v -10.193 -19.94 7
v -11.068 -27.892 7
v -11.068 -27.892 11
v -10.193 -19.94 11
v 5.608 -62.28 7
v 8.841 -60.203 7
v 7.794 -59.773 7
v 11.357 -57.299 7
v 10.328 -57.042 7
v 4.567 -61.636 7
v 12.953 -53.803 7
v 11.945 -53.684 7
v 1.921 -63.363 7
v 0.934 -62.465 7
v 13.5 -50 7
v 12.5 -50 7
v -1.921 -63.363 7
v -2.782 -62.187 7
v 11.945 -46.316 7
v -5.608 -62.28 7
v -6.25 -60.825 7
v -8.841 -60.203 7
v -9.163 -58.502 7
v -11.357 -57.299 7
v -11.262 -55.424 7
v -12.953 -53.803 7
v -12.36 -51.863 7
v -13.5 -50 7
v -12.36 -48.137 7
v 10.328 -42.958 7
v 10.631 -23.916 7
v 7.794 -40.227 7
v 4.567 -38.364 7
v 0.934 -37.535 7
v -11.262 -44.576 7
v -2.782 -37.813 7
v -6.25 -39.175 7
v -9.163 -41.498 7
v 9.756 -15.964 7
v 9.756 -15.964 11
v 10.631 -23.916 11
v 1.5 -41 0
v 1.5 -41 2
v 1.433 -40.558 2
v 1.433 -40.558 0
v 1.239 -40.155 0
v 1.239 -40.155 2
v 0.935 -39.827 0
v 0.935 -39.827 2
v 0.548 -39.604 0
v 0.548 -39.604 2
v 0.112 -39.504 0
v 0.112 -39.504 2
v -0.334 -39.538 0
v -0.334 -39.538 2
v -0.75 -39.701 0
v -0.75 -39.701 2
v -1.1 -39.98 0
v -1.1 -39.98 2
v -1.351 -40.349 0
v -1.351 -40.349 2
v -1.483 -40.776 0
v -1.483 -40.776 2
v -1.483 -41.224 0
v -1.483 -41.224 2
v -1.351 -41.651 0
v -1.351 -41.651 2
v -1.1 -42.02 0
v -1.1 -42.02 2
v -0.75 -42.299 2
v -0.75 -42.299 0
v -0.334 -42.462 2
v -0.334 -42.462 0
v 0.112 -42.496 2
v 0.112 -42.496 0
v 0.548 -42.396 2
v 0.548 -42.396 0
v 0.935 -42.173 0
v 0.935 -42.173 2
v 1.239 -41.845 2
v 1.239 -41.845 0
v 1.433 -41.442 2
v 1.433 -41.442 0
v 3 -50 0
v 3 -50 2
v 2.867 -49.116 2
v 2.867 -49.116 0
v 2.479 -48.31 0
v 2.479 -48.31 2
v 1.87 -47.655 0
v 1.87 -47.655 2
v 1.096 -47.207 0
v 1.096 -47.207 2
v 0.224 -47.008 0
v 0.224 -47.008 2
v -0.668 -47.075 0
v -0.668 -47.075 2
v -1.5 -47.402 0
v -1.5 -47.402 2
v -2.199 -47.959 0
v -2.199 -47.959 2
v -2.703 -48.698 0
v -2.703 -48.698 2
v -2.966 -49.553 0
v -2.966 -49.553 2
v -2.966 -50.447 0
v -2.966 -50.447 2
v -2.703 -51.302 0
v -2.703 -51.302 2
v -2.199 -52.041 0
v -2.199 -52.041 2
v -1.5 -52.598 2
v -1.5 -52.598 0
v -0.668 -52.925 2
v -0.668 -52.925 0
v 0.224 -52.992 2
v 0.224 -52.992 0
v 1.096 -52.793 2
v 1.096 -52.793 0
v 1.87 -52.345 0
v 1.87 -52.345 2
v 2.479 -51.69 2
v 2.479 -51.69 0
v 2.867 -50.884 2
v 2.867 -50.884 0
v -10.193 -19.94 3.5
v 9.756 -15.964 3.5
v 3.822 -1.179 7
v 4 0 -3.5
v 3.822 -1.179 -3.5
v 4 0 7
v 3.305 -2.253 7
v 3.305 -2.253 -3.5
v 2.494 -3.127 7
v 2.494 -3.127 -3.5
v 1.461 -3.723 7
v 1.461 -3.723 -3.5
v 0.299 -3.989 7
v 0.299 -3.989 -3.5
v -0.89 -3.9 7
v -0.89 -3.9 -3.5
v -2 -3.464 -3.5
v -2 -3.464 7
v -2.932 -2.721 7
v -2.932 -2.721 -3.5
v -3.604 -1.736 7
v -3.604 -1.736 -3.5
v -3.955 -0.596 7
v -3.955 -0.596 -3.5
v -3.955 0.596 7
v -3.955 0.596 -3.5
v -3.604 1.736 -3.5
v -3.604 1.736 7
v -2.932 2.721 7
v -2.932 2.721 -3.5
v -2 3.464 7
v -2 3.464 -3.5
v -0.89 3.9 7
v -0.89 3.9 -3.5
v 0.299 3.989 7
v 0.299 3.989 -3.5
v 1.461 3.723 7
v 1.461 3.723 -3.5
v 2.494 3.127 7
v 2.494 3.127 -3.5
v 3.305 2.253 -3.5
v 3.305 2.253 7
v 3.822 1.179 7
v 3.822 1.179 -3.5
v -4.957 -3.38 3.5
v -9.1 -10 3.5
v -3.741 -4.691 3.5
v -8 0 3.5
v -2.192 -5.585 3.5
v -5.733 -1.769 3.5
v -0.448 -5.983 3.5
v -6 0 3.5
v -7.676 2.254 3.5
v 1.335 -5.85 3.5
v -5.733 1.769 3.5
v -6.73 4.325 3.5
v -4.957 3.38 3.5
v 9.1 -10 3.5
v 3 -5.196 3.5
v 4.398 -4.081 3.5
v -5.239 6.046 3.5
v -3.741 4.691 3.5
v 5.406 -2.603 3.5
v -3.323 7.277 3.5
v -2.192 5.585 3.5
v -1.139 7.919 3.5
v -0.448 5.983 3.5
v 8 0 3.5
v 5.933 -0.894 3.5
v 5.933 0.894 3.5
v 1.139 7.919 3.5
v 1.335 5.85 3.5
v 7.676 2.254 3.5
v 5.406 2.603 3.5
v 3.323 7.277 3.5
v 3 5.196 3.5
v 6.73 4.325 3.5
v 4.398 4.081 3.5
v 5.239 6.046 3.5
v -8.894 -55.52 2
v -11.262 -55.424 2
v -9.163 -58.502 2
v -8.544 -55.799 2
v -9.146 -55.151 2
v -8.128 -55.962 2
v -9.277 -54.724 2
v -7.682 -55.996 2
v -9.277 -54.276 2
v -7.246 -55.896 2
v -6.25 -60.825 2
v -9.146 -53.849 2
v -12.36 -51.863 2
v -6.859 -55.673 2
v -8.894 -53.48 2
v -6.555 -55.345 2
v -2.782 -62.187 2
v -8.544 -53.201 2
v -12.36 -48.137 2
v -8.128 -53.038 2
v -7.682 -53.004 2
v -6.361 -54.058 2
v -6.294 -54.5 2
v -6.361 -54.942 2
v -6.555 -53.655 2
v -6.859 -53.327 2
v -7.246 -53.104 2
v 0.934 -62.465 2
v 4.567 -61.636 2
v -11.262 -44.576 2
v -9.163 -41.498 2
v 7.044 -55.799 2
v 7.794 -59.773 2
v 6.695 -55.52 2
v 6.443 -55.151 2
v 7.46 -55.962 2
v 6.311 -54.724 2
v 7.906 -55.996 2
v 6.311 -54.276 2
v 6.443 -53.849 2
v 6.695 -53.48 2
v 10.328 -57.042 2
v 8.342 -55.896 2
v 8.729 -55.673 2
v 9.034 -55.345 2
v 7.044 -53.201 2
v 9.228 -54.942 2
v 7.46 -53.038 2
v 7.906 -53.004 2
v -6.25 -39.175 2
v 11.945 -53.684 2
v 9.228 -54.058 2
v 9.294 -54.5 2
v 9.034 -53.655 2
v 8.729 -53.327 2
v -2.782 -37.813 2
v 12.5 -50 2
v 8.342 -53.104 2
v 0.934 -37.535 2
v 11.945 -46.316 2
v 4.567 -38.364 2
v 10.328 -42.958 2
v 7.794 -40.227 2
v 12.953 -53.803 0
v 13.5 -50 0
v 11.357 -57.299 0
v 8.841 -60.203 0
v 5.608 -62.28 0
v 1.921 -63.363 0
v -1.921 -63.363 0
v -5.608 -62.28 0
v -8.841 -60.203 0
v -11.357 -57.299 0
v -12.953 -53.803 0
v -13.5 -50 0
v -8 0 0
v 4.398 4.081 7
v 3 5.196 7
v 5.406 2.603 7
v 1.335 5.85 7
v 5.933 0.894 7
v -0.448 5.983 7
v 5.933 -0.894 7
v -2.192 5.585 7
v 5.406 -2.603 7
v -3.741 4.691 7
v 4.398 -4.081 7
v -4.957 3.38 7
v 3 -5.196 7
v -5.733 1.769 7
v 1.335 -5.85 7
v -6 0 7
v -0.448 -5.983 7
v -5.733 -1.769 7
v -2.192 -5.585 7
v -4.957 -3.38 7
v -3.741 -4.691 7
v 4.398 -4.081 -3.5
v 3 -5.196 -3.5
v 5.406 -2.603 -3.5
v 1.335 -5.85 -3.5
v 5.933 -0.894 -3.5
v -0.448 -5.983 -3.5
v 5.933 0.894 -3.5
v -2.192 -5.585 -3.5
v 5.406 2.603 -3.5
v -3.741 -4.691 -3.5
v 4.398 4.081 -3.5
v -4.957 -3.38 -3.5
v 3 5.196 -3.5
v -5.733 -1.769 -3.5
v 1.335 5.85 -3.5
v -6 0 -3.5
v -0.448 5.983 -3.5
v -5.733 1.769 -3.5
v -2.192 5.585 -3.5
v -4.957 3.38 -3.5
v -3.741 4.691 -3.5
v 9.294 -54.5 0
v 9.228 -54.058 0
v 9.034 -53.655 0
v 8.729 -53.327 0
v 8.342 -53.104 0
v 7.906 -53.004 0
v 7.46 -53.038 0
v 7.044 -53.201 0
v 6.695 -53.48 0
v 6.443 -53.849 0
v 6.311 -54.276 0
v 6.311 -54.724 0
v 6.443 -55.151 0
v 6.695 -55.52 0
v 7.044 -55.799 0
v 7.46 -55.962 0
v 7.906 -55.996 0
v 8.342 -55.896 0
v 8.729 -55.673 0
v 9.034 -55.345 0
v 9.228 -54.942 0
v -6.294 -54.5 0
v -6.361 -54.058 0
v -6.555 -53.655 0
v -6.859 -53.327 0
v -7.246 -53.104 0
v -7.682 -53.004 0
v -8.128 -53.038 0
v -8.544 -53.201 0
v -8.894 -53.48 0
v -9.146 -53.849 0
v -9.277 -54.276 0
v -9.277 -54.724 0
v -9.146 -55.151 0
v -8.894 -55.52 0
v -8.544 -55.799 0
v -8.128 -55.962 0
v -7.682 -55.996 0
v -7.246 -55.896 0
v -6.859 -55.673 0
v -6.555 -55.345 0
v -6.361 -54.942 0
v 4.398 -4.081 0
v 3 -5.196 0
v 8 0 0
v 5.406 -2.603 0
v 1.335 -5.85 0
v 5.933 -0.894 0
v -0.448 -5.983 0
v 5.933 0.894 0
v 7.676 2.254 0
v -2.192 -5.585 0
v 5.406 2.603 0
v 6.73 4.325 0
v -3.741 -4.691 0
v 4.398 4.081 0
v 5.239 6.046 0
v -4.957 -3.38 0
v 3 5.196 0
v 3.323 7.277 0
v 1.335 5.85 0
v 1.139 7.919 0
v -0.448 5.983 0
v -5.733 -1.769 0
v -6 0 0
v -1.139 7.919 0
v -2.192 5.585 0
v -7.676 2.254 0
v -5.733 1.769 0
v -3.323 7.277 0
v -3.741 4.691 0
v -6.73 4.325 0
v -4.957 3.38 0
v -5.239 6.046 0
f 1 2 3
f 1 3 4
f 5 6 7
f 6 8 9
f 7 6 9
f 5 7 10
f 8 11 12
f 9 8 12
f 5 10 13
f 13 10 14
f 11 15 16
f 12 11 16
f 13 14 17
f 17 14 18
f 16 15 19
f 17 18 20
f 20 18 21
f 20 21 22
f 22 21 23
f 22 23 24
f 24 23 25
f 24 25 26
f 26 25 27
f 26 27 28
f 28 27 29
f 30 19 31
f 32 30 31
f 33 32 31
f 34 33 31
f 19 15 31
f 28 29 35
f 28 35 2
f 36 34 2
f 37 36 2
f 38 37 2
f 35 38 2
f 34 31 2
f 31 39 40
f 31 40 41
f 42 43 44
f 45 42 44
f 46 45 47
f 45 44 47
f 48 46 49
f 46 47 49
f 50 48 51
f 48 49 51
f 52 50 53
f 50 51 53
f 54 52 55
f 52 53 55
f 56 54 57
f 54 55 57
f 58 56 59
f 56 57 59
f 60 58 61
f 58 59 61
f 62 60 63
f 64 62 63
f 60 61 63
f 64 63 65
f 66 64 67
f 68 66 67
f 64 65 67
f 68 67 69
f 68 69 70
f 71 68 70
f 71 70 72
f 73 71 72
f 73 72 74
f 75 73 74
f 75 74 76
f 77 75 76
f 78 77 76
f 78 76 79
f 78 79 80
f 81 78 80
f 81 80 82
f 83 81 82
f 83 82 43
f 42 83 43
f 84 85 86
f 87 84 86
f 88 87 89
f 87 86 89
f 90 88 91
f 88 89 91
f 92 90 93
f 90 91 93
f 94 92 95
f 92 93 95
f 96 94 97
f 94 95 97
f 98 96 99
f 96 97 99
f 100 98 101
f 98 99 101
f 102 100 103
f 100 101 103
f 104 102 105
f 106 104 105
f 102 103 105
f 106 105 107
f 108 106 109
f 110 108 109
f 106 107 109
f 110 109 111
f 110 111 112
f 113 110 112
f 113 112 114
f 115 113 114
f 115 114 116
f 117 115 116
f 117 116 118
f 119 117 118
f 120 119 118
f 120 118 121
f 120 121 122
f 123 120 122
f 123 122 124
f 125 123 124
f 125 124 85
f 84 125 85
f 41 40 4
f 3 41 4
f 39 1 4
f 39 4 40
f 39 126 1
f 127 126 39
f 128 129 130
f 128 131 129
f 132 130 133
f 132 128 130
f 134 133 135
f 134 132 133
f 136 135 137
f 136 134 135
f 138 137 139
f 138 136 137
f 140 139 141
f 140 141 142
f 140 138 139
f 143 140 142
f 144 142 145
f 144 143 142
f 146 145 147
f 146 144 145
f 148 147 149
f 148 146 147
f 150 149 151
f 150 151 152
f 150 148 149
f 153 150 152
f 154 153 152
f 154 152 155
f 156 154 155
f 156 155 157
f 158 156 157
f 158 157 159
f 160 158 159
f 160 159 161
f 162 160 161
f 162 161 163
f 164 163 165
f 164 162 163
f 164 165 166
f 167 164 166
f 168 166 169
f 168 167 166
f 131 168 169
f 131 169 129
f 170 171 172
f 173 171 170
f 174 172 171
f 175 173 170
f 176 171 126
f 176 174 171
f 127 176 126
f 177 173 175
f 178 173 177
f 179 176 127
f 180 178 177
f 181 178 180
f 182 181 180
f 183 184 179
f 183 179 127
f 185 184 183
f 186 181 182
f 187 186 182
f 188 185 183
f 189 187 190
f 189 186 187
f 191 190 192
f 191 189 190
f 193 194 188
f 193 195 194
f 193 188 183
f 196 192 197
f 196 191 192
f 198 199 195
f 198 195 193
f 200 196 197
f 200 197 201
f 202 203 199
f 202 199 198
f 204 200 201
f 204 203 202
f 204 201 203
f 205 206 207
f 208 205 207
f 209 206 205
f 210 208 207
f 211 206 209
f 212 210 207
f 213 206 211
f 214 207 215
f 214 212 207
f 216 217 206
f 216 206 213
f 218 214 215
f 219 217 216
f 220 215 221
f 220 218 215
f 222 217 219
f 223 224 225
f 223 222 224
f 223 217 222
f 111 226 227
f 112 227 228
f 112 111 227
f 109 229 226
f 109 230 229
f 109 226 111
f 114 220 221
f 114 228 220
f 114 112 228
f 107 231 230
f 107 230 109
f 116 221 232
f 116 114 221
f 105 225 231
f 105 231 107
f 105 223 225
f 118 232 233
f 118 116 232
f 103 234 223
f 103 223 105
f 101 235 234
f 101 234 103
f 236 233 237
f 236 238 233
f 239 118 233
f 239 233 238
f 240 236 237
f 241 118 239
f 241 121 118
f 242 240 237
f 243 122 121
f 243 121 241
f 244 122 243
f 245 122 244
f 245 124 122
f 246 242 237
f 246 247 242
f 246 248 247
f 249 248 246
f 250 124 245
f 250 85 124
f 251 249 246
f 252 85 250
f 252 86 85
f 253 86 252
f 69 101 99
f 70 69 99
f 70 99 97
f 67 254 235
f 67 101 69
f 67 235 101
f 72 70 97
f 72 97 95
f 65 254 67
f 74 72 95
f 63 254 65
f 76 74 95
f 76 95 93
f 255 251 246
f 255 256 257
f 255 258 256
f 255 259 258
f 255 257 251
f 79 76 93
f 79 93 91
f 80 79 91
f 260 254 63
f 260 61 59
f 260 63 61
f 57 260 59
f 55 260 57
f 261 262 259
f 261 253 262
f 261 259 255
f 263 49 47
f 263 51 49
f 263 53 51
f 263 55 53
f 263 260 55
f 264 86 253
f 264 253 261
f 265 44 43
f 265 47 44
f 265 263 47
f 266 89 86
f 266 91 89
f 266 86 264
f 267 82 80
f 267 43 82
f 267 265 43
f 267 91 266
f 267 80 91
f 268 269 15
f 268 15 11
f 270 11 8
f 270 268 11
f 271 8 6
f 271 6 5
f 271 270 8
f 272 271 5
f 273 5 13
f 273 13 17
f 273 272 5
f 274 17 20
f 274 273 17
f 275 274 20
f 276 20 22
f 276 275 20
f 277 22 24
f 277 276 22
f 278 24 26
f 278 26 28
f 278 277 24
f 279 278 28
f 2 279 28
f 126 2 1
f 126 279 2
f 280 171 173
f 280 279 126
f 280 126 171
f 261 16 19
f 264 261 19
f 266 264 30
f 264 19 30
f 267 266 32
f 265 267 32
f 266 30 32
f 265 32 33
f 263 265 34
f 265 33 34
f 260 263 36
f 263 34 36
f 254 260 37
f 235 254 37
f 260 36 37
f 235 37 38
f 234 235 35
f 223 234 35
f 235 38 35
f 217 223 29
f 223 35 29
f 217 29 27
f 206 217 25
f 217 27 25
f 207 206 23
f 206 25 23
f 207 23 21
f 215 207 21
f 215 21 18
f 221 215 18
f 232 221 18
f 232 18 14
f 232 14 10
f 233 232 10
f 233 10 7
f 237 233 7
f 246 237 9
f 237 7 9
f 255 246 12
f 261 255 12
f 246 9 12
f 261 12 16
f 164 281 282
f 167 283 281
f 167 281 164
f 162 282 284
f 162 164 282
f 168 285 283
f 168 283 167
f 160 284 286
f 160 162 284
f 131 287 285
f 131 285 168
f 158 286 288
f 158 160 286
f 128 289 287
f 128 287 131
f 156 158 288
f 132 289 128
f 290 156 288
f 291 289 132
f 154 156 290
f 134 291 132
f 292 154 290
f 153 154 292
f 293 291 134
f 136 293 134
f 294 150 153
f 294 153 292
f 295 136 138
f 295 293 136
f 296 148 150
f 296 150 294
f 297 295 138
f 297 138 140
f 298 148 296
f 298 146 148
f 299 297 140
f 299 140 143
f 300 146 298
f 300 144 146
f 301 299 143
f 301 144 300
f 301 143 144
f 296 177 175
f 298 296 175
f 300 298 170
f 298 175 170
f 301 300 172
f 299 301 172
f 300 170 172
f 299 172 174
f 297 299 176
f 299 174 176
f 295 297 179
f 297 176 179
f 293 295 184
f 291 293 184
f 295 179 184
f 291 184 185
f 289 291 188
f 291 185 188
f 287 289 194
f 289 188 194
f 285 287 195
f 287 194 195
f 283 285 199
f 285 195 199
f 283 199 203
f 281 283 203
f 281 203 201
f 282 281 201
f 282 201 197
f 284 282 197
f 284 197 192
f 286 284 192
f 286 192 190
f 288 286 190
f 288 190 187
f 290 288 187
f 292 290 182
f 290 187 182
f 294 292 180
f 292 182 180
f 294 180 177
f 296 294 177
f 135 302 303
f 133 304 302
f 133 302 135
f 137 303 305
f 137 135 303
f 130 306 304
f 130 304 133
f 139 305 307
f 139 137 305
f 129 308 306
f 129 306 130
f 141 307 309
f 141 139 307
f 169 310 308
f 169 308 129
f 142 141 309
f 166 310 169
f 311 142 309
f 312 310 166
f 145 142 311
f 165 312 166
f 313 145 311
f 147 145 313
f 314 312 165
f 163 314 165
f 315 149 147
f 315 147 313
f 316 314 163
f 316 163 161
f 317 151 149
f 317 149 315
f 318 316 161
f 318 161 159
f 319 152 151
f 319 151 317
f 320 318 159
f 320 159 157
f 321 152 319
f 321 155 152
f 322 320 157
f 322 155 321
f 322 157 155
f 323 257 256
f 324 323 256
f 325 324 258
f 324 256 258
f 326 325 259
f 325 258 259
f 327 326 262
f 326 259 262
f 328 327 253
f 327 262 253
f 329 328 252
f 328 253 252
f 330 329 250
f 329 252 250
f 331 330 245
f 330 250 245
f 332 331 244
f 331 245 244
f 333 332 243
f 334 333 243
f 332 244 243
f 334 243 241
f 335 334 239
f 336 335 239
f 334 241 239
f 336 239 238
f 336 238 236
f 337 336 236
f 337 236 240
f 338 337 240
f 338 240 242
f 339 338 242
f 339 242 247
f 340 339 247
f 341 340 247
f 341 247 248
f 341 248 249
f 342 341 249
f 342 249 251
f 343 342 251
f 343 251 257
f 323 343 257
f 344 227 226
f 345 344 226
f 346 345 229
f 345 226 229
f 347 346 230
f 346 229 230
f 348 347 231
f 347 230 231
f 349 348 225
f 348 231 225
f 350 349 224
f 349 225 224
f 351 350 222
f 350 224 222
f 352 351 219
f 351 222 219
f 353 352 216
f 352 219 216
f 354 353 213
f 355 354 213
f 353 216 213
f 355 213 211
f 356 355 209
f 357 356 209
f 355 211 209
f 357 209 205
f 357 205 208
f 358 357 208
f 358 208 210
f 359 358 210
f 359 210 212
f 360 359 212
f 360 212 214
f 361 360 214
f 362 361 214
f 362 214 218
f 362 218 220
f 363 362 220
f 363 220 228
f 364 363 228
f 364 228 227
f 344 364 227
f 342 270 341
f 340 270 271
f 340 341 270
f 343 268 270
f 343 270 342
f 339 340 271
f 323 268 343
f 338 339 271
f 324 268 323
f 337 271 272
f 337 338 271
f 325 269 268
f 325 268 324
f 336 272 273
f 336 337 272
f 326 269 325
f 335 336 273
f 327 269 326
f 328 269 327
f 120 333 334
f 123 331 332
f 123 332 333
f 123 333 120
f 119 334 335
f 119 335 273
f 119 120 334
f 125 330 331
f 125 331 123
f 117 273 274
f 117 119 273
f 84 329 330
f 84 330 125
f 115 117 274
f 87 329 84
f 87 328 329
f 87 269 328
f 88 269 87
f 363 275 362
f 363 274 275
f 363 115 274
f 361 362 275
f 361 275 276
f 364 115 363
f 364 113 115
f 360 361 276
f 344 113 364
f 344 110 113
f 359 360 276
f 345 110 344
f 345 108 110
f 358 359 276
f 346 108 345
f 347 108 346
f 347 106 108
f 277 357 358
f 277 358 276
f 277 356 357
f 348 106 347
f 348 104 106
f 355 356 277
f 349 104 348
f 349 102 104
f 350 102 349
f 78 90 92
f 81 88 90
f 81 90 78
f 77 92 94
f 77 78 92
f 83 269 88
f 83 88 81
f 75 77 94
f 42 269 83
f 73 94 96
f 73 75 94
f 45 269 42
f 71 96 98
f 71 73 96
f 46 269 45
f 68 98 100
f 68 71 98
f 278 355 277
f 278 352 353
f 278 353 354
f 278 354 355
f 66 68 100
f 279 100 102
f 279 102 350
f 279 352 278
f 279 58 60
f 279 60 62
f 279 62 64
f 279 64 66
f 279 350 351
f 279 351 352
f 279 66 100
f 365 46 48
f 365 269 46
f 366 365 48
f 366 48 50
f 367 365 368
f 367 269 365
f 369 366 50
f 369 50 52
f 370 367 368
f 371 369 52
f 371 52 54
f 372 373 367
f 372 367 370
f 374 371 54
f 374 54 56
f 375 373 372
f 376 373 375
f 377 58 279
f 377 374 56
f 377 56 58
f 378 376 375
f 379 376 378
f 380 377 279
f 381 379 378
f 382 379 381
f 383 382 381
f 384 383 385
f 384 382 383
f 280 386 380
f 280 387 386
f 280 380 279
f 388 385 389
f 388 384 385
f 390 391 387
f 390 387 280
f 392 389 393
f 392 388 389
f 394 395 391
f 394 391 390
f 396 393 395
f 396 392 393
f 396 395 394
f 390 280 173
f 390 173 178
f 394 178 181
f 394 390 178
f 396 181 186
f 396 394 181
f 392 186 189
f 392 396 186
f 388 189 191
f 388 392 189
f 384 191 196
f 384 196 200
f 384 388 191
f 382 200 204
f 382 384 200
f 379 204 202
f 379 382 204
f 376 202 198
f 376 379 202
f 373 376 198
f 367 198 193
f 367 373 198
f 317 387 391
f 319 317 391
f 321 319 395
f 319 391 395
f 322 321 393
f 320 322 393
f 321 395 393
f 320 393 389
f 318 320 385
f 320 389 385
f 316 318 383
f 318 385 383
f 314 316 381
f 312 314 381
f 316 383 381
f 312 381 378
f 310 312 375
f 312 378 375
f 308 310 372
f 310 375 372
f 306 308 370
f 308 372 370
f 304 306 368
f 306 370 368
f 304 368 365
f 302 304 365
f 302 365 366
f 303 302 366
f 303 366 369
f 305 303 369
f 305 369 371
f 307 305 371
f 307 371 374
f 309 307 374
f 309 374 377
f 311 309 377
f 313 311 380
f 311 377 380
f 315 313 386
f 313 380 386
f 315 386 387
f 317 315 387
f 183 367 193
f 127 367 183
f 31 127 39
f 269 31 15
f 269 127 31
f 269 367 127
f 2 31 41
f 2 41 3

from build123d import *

# Parameters (mm, degrees)
BOSS_EXTRU_1_DEPTH      = 7
ESQUISSE2_R             = 3
ENL_V_MAT_EXTRU_1_DEPTH = 7
ESQUISSE3_R             = 1.5
ENL_V_MAT_EXTRU_2_DEPTH = 7
ESQUISSE5_R             = 12.5
ENL_V_MAT_EXTRU_5_DEPTH = 5
ESQUISSE10_W            = 27
ESQUISSE10_H            = 3.5
ENL_V_MAT_EXTRU_6_DEPTH = 20
ESQUISSE12_R            = 6
BOSS_EXTRU_3_DEPTH      = 3.5
ESQUISSE13_R            = 4
ENL_V_MAT_EXTRU_7_DEPTH = 66.295482233
ENL_V_MAT_EXTRU_8_DEPTH = 3.5
BOSS_EXTRU_4_DEPTH      = 4
ESQUISSE16_R            = 6
ESQUISSE16_R_2          = 4
BOSS_EXTRU_5_DEPTH      = 3.5


with BuildPart() as part:
    # Esquisse1 → Boss.-Extru.1 (new body)
    with BuildSketch(Plane.XY):
        with BuildLine():
            Line((8, 0), (13.5, -50))
            ThreePointArc((13.5, -50), (0, -63.5), (-13.5, -50))
            Line((-13.5, -50), (-8, 0))
            ThreePointArc((-8, 0), (0, 8), (8, 0))
        make_face()
    extrude(amount=BOSS_EXTRU_1_DEPTH)

    # Esquisse2 → Enlèv. mat.-Extru.1 (cut)
    with BuildSketch(Plane.XY.offset(7)):
        with Locations((0, -50)):
            Circle(ESQUISSE2_R)
    extrude(amount=-ENL_V_MAT_EXTRU_1_DEPTH, mode=Mode.SUBTRACT)

    # Esquisse3 → Enlèv. mat.-Extru.2 (cut)
    with BuildSketch(Plane.XY.offset(7)):
        with Locations((0, -41)):
            Circle(ESQUISSE3_R)
        with Locations((-7.794228634, -54.5)):
            Circle(ESQUISSE3_R)
        with Locations((7.794228634, -54.5)):
            Circle(ESQUISSE3_R)
    extrude(amount=-ENL_V_MAT_EXTRU_2_DEPTH, mode=Mode.SUBTRACT)

    # Esquisse5 → Enlèv. mat.-Extru.5 (cut)
    with BuildSketch(Plane.XY.offset(7)):
        with Locations((0, -50)):
            Circle(ESQUISSE5_R)
    extrude(amount=-ENL_V_MAT_EXTRU_5_DEPTH, mode=Mode.SUBTRACT)

    # Esquisse10 → Enlèv. mat.-Extru.6 (cut)
    with BuildSketch(Plane(origin=(0, 10, 0), x_dir=(1, 0, 0), z_dir=(0, 1, 0))):
        with Locations((0, -5.25)):
            Rectangle(ESQUISSE10_W, ESQUISSE10_H)
    extrude(amount=-ENL_V_MAT_EXTRU_6_DEPTH, mode=Mode.SUBTRACT)

    # Esquisse12 → Boss.-Extru.3 (add)
    with BuildSketch(Plane.XY.offset(3.5)):
        with Locations(Location((0, 0, 0), (0, 0, 180))):
            Circle(ESQUISSE12_R)
    extrude(amount=BOSS_EXTRU_3_DEPTH)

    # Esquisse13 → Enlèv. mat.-Extru.7 (cut, through all)
    with BuildSketch(Plane.XY.offset(7)):
        Circle(ESQUISSE13_R)
    extrude(amount=-ENL_V_MAT_EXTRU_7_DEPTH, mode=Mode.SUBTRACT)

    # Esquisse14 → Enlèv. mat.-Extru.8 (cut)
    with BuildSketch(Plane.XY.offset(7)):
        Polygon((-9.1, -10), (-10.193404792, -19.940043559), (9.756042875, -15.964026136), (9.1, -10), align=None)
    extrude(amount=-ENL_V_MAT_EXTRU_8_DEPTH, mode=Mode.SUBTRACT)

    # Esquisse15 → Boss.-Extru.4 (add)
    with BuildSketch(Plane.XY.offset(7)):
        Polygon((-10.193404792, -19.940043559), (9.756042875, -15.964026136), (10.630766708, -23.916060983), (-11.068128625, -27.892078407), align=None)
    extrude(amount=BOSS_EXTRU_4_DEPTH)

    # Esquisse16 → Boss.-Extru.5 (add)
    with BuildSketch(Plane(origin=(0, 0, 0), x_dir=(-1, 0, 0), z_dir=(0, 0, -1))):
        Circle(ESQUISSE16_R)
        with Locations(Location((0, 0, 0), (0, 0, 180))):
            Circle(ESQUISSE16_R_2, mode=Mode.SUBTRACT)
    extrude(amount=BOSS_EXTRU_5_DEPTH)


solid = part.part
